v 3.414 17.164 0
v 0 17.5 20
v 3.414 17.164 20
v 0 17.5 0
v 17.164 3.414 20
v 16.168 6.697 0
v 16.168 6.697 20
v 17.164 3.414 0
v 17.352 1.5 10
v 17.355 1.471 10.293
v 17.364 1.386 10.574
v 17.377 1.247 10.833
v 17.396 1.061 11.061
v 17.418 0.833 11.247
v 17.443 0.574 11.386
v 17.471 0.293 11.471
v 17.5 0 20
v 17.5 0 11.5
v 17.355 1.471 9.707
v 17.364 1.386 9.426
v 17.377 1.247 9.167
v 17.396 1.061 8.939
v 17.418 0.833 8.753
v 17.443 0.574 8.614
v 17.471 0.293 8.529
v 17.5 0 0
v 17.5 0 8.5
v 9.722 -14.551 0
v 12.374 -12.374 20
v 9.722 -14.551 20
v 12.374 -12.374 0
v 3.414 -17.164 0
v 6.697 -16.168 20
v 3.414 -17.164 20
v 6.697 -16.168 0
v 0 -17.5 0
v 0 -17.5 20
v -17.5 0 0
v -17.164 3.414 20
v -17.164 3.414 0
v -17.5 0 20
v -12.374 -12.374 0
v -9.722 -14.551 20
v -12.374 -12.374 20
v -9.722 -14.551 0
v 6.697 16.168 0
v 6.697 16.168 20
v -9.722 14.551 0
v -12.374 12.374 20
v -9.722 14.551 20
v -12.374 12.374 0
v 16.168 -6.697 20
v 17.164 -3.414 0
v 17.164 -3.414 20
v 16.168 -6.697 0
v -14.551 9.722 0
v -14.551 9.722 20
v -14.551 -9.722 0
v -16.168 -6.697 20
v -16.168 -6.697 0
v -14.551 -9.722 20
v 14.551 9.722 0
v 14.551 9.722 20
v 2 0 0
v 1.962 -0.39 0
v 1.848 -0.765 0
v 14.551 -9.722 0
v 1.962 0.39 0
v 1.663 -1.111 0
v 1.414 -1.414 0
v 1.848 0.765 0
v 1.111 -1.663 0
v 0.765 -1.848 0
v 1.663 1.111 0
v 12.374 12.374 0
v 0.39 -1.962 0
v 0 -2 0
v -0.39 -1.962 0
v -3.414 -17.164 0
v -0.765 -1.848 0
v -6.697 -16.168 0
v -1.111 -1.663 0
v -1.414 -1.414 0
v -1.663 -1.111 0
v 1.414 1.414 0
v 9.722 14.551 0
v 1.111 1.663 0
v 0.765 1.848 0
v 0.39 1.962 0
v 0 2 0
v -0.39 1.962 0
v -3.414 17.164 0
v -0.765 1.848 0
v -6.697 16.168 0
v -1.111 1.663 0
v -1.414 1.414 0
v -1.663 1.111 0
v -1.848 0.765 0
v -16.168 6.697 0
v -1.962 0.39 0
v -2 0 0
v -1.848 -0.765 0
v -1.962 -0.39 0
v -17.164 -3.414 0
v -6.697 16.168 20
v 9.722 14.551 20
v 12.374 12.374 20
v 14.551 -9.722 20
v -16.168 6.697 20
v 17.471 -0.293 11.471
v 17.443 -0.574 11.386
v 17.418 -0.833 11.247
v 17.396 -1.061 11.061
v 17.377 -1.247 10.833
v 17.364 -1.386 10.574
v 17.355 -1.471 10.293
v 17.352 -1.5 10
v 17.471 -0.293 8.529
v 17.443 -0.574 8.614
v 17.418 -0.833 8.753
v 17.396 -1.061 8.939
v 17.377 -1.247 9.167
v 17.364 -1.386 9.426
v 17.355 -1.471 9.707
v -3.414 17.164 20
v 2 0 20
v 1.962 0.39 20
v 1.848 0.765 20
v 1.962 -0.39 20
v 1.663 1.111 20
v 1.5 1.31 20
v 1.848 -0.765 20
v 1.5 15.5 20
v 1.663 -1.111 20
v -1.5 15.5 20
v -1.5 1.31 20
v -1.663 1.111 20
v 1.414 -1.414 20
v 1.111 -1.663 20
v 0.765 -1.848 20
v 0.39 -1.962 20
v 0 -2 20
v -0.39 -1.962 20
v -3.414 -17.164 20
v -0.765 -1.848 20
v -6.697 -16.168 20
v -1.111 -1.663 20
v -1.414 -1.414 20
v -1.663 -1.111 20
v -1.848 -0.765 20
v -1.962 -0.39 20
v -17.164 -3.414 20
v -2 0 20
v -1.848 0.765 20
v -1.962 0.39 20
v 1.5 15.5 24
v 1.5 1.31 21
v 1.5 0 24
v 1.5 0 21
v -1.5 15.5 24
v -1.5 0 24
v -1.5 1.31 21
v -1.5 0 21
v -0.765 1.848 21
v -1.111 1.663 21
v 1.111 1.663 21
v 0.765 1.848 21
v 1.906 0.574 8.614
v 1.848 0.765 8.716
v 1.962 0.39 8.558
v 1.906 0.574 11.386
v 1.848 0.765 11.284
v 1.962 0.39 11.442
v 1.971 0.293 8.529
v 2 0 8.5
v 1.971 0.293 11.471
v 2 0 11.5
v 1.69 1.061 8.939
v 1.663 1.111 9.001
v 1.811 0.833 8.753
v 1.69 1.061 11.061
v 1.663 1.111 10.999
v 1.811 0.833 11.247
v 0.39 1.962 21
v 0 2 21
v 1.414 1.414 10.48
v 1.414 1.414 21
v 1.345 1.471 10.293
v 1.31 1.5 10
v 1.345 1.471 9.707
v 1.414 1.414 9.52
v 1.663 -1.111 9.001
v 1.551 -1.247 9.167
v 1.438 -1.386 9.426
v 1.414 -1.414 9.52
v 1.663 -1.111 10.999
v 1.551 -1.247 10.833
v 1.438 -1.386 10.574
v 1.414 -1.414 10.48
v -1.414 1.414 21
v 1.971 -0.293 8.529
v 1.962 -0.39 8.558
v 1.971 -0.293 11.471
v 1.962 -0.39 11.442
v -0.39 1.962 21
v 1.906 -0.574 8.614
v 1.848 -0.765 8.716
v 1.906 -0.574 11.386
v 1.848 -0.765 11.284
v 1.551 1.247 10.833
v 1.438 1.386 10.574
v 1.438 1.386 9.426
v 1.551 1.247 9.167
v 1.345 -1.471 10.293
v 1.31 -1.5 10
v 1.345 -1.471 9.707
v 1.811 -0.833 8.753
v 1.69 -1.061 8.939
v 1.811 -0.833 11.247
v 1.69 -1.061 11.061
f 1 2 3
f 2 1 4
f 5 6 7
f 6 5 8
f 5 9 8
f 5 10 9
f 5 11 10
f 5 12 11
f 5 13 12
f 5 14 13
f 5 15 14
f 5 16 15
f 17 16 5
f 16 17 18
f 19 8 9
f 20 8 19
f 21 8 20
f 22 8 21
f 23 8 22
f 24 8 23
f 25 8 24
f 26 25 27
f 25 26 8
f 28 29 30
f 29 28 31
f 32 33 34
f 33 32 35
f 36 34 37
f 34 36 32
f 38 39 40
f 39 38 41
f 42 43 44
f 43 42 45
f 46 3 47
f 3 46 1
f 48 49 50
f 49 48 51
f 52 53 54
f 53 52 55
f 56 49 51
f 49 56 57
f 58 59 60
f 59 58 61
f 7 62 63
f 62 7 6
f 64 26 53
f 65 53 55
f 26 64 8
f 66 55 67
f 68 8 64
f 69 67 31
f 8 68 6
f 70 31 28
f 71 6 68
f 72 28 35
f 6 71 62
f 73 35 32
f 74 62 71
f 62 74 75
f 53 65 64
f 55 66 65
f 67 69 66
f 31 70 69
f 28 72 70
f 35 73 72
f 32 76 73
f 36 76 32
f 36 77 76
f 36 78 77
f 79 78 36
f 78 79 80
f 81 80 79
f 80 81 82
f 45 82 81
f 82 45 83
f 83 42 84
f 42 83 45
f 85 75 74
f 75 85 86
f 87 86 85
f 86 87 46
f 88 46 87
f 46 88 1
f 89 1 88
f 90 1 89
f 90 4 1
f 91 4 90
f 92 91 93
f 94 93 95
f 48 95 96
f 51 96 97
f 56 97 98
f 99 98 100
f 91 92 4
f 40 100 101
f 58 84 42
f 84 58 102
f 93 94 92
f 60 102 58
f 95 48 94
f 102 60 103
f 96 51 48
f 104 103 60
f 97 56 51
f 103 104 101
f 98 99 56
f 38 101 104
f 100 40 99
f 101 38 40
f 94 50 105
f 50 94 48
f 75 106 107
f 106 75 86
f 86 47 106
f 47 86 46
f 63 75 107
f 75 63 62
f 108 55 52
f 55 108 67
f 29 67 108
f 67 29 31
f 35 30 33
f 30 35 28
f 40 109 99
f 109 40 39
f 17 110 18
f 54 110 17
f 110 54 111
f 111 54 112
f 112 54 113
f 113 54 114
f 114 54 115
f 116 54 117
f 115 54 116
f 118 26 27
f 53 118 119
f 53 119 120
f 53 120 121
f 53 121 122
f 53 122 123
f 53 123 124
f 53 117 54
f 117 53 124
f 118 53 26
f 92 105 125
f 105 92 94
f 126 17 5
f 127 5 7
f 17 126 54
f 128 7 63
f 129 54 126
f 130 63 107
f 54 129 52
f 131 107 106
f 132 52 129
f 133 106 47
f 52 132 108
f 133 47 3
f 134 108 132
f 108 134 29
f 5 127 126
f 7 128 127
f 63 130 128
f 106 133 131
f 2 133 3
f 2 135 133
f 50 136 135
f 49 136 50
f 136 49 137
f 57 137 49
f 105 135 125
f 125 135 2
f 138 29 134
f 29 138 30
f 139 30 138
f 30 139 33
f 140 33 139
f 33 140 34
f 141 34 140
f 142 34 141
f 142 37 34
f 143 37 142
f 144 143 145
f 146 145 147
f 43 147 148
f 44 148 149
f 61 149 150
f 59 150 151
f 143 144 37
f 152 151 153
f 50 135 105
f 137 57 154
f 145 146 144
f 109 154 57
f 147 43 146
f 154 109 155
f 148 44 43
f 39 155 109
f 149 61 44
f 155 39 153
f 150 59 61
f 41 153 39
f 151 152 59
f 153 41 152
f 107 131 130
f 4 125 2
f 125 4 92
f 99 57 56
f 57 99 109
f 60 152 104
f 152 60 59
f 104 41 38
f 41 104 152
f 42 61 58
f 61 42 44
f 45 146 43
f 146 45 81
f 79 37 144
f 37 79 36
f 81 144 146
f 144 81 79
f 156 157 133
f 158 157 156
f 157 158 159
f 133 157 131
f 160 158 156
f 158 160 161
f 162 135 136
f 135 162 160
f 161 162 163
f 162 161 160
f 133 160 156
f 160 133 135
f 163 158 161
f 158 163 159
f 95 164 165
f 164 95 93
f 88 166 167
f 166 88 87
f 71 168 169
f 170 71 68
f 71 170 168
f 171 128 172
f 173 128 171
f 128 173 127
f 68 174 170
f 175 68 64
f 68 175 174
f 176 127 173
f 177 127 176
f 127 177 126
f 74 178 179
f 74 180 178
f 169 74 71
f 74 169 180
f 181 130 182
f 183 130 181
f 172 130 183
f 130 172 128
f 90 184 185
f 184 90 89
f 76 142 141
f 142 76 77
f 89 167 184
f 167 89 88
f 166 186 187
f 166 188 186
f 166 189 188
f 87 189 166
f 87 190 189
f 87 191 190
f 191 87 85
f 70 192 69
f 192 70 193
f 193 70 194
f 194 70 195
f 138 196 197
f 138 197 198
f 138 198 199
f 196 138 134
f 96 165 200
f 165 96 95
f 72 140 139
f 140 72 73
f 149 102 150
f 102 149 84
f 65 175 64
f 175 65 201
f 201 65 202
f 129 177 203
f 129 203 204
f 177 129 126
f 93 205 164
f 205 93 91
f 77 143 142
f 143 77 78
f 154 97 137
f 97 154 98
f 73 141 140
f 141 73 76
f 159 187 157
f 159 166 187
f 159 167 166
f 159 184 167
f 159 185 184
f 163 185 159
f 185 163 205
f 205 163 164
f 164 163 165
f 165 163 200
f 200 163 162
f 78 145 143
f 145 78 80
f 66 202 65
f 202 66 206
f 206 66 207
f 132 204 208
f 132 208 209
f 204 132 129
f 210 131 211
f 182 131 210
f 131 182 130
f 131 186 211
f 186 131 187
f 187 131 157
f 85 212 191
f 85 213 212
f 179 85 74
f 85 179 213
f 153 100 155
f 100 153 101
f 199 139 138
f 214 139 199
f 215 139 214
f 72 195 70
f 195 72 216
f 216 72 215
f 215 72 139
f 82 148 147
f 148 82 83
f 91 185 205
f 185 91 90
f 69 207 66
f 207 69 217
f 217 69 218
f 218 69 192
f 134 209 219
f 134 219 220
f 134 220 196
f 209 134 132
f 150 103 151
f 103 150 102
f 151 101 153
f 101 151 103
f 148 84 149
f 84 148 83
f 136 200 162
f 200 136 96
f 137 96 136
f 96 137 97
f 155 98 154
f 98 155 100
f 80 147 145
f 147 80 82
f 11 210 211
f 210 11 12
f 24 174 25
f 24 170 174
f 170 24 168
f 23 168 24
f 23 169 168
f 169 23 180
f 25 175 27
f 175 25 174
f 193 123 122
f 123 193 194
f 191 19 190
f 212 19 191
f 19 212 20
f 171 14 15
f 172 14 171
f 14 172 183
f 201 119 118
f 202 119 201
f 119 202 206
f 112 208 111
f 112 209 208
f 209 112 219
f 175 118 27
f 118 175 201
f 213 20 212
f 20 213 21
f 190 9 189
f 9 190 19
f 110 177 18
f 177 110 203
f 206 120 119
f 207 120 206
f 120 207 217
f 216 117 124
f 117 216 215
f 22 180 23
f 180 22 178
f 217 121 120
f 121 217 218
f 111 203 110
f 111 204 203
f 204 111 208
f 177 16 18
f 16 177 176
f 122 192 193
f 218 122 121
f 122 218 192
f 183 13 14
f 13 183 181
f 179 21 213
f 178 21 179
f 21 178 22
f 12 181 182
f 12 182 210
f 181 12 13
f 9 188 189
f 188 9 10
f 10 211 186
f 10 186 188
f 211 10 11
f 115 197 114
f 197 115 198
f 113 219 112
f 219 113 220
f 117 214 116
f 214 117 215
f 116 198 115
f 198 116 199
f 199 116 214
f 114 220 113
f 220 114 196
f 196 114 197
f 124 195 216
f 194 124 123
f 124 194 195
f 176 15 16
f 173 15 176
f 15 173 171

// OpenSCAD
$fn = 32;

// ----------------------------------------------------------------------
// Control knob: pointer knob
// ----------------------------------------------------------------------

// --- parameters (mm) ---
rib_w = 3;                // pointer rib width
rib_h = 5;                // pointer rib height
knob_d = 35;              // knob body diameter
knob_h = 20;              // knob body height
bore_d = 4;               // shaft bore diameter
set_d = 3;                // set screw bore diameter

rib_poke = rib_h - 1;  // rib height above the top
total_h = knob_h + rib_h - 1;  // overall height

difference() {
  union() {
    cylinder(h = knob_h, d = knob_d);
    translate([-rib_w / 2, 0, knob_h - 1])
      cube([rib_w, knob_d / 2 - 2, rib_h]);
  }
  translate([0, 0, -1]) cylinder(h = knob_h + 2, d = bore_d);
  translate([-1, 0, knob_h / 2]) rotate([0, 90, 0])
    cylinder(h = knob_d / 2 + bore_d / 2 + 2, d = set_d);}
